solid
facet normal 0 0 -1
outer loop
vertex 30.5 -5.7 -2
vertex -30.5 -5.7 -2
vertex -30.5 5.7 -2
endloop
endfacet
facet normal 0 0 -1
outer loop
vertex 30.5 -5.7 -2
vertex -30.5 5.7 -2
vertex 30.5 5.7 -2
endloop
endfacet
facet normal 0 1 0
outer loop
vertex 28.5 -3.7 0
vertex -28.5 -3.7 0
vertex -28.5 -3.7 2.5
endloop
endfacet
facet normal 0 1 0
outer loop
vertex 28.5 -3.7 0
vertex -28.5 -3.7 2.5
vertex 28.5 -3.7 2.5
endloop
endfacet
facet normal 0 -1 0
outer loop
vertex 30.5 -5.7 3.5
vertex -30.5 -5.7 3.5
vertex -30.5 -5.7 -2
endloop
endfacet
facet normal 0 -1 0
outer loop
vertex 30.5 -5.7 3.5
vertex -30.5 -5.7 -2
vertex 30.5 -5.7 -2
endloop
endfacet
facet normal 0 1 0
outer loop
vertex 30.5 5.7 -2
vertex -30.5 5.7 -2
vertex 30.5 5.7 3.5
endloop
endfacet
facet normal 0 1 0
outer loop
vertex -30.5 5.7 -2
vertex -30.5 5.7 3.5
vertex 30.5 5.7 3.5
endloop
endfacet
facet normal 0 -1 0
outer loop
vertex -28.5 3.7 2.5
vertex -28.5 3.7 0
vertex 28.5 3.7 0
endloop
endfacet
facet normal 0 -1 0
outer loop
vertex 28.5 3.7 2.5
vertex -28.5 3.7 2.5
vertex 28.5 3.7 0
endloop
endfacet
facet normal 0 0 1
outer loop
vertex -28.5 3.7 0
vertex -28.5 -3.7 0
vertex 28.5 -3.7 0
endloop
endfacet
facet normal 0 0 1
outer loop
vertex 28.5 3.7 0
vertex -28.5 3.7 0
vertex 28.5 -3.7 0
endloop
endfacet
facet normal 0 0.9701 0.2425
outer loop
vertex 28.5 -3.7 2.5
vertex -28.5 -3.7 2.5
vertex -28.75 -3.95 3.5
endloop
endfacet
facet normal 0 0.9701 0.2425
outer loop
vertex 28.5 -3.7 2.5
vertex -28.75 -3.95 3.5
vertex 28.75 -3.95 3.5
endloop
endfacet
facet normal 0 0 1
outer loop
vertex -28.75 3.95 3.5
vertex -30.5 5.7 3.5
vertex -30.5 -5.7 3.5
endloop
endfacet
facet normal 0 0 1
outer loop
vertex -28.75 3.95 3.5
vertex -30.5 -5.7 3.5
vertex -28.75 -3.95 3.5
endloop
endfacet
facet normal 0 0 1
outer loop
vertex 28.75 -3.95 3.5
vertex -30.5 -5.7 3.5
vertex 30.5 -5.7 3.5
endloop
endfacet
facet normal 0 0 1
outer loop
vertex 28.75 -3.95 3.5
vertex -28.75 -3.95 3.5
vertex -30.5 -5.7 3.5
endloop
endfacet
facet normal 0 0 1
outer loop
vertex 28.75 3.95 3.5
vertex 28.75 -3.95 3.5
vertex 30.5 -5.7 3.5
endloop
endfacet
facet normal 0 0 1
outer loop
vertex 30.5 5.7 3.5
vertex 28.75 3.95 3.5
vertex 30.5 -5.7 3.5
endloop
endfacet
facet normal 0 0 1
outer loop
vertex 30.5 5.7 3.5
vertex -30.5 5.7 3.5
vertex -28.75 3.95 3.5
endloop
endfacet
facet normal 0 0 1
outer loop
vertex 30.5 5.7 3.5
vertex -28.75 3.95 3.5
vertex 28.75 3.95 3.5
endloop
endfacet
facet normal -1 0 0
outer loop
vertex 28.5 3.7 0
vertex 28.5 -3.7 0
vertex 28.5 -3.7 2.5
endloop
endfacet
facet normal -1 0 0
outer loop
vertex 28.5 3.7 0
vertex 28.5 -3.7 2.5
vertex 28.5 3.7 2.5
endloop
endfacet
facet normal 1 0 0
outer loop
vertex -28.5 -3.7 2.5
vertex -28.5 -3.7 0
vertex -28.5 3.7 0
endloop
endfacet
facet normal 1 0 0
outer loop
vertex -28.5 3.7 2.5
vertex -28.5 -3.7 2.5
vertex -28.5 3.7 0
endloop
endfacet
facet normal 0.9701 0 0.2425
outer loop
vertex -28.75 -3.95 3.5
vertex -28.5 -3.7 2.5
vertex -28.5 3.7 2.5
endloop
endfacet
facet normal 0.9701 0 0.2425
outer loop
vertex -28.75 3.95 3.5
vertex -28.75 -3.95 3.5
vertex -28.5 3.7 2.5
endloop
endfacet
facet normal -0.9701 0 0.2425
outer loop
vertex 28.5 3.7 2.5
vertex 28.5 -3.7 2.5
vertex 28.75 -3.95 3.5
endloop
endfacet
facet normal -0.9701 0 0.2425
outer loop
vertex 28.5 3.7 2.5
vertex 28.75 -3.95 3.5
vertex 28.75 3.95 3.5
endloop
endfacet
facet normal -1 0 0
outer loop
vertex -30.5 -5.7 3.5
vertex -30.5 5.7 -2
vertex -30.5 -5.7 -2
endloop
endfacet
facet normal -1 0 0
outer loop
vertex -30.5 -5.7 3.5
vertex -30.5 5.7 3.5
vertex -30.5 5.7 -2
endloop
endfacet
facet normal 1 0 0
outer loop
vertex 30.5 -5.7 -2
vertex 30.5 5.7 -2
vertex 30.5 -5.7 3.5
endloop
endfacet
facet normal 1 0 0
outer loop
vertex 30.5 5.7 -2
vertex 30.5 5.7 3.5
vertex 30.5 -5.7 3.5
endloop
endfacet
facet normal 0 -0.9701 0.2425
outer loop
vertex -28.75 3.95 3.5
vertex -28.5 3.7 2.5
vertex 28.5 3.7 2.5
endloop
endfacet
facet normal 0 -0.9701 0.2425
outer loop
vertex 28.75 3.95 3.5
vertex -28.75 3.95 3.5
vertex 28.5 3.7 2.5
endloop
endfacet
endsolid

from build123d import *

# Parameters (mm, degrees)
SKETCH_W      = 61
SKETCH_H      = 11.4
SKETCH_W_2    = 57
SKETCH_H_2    = 7.4
PAD_DEPTH     = 3.5
SKETCH001_W   = 61
SKETCH001_H   = 11.4
PAD001_DEPTH  = 2
CHAMFER_SIZE2 = 1
CHAMFER_SIZE  = 0.25


with BuildPart() as part:
    # Sketch → Pad (new body)
    with BuildSketch(Plane.XY):
        Rectangle(SKETCH_W, SKETCH_H)
        Rectangle(SKETCH_W_2, SKETCH_H_2, mode=Mode.SUBTRACT)
    extrude(amount=PAD_DEPTH)

    # Sketch001 (on Face9 of Pad) → Pad001 (join)
    with BuildSketch(Plane(origin=(0, 0, 0), x_dir=(1, 0, 0), z_dir=(0, 0, -1))):
        Rectangle(SKETCH001_W, SKETCH001_H)
    extrude(amount=PAD001_DEPTH)

    # Chamfer
    chamfer_edges = [part.edges().sort_by_distance(p)[0] for p in [
        (0, 3.7, 3.5),
        (-28.5, 0, 3.5),
        (0, -3.7, 3.5),
        (28.5, 0, 3.5),
    ]]
    chamfer_side = part.faces().sort_by_distance((29.879439, 0, 3.5))[0]
    chamfer(chamfer_edges, length=CHAMFER_SIZE, length2=CHAMFER_SIZE2, reference=chamfer_side)


solid = part.part
